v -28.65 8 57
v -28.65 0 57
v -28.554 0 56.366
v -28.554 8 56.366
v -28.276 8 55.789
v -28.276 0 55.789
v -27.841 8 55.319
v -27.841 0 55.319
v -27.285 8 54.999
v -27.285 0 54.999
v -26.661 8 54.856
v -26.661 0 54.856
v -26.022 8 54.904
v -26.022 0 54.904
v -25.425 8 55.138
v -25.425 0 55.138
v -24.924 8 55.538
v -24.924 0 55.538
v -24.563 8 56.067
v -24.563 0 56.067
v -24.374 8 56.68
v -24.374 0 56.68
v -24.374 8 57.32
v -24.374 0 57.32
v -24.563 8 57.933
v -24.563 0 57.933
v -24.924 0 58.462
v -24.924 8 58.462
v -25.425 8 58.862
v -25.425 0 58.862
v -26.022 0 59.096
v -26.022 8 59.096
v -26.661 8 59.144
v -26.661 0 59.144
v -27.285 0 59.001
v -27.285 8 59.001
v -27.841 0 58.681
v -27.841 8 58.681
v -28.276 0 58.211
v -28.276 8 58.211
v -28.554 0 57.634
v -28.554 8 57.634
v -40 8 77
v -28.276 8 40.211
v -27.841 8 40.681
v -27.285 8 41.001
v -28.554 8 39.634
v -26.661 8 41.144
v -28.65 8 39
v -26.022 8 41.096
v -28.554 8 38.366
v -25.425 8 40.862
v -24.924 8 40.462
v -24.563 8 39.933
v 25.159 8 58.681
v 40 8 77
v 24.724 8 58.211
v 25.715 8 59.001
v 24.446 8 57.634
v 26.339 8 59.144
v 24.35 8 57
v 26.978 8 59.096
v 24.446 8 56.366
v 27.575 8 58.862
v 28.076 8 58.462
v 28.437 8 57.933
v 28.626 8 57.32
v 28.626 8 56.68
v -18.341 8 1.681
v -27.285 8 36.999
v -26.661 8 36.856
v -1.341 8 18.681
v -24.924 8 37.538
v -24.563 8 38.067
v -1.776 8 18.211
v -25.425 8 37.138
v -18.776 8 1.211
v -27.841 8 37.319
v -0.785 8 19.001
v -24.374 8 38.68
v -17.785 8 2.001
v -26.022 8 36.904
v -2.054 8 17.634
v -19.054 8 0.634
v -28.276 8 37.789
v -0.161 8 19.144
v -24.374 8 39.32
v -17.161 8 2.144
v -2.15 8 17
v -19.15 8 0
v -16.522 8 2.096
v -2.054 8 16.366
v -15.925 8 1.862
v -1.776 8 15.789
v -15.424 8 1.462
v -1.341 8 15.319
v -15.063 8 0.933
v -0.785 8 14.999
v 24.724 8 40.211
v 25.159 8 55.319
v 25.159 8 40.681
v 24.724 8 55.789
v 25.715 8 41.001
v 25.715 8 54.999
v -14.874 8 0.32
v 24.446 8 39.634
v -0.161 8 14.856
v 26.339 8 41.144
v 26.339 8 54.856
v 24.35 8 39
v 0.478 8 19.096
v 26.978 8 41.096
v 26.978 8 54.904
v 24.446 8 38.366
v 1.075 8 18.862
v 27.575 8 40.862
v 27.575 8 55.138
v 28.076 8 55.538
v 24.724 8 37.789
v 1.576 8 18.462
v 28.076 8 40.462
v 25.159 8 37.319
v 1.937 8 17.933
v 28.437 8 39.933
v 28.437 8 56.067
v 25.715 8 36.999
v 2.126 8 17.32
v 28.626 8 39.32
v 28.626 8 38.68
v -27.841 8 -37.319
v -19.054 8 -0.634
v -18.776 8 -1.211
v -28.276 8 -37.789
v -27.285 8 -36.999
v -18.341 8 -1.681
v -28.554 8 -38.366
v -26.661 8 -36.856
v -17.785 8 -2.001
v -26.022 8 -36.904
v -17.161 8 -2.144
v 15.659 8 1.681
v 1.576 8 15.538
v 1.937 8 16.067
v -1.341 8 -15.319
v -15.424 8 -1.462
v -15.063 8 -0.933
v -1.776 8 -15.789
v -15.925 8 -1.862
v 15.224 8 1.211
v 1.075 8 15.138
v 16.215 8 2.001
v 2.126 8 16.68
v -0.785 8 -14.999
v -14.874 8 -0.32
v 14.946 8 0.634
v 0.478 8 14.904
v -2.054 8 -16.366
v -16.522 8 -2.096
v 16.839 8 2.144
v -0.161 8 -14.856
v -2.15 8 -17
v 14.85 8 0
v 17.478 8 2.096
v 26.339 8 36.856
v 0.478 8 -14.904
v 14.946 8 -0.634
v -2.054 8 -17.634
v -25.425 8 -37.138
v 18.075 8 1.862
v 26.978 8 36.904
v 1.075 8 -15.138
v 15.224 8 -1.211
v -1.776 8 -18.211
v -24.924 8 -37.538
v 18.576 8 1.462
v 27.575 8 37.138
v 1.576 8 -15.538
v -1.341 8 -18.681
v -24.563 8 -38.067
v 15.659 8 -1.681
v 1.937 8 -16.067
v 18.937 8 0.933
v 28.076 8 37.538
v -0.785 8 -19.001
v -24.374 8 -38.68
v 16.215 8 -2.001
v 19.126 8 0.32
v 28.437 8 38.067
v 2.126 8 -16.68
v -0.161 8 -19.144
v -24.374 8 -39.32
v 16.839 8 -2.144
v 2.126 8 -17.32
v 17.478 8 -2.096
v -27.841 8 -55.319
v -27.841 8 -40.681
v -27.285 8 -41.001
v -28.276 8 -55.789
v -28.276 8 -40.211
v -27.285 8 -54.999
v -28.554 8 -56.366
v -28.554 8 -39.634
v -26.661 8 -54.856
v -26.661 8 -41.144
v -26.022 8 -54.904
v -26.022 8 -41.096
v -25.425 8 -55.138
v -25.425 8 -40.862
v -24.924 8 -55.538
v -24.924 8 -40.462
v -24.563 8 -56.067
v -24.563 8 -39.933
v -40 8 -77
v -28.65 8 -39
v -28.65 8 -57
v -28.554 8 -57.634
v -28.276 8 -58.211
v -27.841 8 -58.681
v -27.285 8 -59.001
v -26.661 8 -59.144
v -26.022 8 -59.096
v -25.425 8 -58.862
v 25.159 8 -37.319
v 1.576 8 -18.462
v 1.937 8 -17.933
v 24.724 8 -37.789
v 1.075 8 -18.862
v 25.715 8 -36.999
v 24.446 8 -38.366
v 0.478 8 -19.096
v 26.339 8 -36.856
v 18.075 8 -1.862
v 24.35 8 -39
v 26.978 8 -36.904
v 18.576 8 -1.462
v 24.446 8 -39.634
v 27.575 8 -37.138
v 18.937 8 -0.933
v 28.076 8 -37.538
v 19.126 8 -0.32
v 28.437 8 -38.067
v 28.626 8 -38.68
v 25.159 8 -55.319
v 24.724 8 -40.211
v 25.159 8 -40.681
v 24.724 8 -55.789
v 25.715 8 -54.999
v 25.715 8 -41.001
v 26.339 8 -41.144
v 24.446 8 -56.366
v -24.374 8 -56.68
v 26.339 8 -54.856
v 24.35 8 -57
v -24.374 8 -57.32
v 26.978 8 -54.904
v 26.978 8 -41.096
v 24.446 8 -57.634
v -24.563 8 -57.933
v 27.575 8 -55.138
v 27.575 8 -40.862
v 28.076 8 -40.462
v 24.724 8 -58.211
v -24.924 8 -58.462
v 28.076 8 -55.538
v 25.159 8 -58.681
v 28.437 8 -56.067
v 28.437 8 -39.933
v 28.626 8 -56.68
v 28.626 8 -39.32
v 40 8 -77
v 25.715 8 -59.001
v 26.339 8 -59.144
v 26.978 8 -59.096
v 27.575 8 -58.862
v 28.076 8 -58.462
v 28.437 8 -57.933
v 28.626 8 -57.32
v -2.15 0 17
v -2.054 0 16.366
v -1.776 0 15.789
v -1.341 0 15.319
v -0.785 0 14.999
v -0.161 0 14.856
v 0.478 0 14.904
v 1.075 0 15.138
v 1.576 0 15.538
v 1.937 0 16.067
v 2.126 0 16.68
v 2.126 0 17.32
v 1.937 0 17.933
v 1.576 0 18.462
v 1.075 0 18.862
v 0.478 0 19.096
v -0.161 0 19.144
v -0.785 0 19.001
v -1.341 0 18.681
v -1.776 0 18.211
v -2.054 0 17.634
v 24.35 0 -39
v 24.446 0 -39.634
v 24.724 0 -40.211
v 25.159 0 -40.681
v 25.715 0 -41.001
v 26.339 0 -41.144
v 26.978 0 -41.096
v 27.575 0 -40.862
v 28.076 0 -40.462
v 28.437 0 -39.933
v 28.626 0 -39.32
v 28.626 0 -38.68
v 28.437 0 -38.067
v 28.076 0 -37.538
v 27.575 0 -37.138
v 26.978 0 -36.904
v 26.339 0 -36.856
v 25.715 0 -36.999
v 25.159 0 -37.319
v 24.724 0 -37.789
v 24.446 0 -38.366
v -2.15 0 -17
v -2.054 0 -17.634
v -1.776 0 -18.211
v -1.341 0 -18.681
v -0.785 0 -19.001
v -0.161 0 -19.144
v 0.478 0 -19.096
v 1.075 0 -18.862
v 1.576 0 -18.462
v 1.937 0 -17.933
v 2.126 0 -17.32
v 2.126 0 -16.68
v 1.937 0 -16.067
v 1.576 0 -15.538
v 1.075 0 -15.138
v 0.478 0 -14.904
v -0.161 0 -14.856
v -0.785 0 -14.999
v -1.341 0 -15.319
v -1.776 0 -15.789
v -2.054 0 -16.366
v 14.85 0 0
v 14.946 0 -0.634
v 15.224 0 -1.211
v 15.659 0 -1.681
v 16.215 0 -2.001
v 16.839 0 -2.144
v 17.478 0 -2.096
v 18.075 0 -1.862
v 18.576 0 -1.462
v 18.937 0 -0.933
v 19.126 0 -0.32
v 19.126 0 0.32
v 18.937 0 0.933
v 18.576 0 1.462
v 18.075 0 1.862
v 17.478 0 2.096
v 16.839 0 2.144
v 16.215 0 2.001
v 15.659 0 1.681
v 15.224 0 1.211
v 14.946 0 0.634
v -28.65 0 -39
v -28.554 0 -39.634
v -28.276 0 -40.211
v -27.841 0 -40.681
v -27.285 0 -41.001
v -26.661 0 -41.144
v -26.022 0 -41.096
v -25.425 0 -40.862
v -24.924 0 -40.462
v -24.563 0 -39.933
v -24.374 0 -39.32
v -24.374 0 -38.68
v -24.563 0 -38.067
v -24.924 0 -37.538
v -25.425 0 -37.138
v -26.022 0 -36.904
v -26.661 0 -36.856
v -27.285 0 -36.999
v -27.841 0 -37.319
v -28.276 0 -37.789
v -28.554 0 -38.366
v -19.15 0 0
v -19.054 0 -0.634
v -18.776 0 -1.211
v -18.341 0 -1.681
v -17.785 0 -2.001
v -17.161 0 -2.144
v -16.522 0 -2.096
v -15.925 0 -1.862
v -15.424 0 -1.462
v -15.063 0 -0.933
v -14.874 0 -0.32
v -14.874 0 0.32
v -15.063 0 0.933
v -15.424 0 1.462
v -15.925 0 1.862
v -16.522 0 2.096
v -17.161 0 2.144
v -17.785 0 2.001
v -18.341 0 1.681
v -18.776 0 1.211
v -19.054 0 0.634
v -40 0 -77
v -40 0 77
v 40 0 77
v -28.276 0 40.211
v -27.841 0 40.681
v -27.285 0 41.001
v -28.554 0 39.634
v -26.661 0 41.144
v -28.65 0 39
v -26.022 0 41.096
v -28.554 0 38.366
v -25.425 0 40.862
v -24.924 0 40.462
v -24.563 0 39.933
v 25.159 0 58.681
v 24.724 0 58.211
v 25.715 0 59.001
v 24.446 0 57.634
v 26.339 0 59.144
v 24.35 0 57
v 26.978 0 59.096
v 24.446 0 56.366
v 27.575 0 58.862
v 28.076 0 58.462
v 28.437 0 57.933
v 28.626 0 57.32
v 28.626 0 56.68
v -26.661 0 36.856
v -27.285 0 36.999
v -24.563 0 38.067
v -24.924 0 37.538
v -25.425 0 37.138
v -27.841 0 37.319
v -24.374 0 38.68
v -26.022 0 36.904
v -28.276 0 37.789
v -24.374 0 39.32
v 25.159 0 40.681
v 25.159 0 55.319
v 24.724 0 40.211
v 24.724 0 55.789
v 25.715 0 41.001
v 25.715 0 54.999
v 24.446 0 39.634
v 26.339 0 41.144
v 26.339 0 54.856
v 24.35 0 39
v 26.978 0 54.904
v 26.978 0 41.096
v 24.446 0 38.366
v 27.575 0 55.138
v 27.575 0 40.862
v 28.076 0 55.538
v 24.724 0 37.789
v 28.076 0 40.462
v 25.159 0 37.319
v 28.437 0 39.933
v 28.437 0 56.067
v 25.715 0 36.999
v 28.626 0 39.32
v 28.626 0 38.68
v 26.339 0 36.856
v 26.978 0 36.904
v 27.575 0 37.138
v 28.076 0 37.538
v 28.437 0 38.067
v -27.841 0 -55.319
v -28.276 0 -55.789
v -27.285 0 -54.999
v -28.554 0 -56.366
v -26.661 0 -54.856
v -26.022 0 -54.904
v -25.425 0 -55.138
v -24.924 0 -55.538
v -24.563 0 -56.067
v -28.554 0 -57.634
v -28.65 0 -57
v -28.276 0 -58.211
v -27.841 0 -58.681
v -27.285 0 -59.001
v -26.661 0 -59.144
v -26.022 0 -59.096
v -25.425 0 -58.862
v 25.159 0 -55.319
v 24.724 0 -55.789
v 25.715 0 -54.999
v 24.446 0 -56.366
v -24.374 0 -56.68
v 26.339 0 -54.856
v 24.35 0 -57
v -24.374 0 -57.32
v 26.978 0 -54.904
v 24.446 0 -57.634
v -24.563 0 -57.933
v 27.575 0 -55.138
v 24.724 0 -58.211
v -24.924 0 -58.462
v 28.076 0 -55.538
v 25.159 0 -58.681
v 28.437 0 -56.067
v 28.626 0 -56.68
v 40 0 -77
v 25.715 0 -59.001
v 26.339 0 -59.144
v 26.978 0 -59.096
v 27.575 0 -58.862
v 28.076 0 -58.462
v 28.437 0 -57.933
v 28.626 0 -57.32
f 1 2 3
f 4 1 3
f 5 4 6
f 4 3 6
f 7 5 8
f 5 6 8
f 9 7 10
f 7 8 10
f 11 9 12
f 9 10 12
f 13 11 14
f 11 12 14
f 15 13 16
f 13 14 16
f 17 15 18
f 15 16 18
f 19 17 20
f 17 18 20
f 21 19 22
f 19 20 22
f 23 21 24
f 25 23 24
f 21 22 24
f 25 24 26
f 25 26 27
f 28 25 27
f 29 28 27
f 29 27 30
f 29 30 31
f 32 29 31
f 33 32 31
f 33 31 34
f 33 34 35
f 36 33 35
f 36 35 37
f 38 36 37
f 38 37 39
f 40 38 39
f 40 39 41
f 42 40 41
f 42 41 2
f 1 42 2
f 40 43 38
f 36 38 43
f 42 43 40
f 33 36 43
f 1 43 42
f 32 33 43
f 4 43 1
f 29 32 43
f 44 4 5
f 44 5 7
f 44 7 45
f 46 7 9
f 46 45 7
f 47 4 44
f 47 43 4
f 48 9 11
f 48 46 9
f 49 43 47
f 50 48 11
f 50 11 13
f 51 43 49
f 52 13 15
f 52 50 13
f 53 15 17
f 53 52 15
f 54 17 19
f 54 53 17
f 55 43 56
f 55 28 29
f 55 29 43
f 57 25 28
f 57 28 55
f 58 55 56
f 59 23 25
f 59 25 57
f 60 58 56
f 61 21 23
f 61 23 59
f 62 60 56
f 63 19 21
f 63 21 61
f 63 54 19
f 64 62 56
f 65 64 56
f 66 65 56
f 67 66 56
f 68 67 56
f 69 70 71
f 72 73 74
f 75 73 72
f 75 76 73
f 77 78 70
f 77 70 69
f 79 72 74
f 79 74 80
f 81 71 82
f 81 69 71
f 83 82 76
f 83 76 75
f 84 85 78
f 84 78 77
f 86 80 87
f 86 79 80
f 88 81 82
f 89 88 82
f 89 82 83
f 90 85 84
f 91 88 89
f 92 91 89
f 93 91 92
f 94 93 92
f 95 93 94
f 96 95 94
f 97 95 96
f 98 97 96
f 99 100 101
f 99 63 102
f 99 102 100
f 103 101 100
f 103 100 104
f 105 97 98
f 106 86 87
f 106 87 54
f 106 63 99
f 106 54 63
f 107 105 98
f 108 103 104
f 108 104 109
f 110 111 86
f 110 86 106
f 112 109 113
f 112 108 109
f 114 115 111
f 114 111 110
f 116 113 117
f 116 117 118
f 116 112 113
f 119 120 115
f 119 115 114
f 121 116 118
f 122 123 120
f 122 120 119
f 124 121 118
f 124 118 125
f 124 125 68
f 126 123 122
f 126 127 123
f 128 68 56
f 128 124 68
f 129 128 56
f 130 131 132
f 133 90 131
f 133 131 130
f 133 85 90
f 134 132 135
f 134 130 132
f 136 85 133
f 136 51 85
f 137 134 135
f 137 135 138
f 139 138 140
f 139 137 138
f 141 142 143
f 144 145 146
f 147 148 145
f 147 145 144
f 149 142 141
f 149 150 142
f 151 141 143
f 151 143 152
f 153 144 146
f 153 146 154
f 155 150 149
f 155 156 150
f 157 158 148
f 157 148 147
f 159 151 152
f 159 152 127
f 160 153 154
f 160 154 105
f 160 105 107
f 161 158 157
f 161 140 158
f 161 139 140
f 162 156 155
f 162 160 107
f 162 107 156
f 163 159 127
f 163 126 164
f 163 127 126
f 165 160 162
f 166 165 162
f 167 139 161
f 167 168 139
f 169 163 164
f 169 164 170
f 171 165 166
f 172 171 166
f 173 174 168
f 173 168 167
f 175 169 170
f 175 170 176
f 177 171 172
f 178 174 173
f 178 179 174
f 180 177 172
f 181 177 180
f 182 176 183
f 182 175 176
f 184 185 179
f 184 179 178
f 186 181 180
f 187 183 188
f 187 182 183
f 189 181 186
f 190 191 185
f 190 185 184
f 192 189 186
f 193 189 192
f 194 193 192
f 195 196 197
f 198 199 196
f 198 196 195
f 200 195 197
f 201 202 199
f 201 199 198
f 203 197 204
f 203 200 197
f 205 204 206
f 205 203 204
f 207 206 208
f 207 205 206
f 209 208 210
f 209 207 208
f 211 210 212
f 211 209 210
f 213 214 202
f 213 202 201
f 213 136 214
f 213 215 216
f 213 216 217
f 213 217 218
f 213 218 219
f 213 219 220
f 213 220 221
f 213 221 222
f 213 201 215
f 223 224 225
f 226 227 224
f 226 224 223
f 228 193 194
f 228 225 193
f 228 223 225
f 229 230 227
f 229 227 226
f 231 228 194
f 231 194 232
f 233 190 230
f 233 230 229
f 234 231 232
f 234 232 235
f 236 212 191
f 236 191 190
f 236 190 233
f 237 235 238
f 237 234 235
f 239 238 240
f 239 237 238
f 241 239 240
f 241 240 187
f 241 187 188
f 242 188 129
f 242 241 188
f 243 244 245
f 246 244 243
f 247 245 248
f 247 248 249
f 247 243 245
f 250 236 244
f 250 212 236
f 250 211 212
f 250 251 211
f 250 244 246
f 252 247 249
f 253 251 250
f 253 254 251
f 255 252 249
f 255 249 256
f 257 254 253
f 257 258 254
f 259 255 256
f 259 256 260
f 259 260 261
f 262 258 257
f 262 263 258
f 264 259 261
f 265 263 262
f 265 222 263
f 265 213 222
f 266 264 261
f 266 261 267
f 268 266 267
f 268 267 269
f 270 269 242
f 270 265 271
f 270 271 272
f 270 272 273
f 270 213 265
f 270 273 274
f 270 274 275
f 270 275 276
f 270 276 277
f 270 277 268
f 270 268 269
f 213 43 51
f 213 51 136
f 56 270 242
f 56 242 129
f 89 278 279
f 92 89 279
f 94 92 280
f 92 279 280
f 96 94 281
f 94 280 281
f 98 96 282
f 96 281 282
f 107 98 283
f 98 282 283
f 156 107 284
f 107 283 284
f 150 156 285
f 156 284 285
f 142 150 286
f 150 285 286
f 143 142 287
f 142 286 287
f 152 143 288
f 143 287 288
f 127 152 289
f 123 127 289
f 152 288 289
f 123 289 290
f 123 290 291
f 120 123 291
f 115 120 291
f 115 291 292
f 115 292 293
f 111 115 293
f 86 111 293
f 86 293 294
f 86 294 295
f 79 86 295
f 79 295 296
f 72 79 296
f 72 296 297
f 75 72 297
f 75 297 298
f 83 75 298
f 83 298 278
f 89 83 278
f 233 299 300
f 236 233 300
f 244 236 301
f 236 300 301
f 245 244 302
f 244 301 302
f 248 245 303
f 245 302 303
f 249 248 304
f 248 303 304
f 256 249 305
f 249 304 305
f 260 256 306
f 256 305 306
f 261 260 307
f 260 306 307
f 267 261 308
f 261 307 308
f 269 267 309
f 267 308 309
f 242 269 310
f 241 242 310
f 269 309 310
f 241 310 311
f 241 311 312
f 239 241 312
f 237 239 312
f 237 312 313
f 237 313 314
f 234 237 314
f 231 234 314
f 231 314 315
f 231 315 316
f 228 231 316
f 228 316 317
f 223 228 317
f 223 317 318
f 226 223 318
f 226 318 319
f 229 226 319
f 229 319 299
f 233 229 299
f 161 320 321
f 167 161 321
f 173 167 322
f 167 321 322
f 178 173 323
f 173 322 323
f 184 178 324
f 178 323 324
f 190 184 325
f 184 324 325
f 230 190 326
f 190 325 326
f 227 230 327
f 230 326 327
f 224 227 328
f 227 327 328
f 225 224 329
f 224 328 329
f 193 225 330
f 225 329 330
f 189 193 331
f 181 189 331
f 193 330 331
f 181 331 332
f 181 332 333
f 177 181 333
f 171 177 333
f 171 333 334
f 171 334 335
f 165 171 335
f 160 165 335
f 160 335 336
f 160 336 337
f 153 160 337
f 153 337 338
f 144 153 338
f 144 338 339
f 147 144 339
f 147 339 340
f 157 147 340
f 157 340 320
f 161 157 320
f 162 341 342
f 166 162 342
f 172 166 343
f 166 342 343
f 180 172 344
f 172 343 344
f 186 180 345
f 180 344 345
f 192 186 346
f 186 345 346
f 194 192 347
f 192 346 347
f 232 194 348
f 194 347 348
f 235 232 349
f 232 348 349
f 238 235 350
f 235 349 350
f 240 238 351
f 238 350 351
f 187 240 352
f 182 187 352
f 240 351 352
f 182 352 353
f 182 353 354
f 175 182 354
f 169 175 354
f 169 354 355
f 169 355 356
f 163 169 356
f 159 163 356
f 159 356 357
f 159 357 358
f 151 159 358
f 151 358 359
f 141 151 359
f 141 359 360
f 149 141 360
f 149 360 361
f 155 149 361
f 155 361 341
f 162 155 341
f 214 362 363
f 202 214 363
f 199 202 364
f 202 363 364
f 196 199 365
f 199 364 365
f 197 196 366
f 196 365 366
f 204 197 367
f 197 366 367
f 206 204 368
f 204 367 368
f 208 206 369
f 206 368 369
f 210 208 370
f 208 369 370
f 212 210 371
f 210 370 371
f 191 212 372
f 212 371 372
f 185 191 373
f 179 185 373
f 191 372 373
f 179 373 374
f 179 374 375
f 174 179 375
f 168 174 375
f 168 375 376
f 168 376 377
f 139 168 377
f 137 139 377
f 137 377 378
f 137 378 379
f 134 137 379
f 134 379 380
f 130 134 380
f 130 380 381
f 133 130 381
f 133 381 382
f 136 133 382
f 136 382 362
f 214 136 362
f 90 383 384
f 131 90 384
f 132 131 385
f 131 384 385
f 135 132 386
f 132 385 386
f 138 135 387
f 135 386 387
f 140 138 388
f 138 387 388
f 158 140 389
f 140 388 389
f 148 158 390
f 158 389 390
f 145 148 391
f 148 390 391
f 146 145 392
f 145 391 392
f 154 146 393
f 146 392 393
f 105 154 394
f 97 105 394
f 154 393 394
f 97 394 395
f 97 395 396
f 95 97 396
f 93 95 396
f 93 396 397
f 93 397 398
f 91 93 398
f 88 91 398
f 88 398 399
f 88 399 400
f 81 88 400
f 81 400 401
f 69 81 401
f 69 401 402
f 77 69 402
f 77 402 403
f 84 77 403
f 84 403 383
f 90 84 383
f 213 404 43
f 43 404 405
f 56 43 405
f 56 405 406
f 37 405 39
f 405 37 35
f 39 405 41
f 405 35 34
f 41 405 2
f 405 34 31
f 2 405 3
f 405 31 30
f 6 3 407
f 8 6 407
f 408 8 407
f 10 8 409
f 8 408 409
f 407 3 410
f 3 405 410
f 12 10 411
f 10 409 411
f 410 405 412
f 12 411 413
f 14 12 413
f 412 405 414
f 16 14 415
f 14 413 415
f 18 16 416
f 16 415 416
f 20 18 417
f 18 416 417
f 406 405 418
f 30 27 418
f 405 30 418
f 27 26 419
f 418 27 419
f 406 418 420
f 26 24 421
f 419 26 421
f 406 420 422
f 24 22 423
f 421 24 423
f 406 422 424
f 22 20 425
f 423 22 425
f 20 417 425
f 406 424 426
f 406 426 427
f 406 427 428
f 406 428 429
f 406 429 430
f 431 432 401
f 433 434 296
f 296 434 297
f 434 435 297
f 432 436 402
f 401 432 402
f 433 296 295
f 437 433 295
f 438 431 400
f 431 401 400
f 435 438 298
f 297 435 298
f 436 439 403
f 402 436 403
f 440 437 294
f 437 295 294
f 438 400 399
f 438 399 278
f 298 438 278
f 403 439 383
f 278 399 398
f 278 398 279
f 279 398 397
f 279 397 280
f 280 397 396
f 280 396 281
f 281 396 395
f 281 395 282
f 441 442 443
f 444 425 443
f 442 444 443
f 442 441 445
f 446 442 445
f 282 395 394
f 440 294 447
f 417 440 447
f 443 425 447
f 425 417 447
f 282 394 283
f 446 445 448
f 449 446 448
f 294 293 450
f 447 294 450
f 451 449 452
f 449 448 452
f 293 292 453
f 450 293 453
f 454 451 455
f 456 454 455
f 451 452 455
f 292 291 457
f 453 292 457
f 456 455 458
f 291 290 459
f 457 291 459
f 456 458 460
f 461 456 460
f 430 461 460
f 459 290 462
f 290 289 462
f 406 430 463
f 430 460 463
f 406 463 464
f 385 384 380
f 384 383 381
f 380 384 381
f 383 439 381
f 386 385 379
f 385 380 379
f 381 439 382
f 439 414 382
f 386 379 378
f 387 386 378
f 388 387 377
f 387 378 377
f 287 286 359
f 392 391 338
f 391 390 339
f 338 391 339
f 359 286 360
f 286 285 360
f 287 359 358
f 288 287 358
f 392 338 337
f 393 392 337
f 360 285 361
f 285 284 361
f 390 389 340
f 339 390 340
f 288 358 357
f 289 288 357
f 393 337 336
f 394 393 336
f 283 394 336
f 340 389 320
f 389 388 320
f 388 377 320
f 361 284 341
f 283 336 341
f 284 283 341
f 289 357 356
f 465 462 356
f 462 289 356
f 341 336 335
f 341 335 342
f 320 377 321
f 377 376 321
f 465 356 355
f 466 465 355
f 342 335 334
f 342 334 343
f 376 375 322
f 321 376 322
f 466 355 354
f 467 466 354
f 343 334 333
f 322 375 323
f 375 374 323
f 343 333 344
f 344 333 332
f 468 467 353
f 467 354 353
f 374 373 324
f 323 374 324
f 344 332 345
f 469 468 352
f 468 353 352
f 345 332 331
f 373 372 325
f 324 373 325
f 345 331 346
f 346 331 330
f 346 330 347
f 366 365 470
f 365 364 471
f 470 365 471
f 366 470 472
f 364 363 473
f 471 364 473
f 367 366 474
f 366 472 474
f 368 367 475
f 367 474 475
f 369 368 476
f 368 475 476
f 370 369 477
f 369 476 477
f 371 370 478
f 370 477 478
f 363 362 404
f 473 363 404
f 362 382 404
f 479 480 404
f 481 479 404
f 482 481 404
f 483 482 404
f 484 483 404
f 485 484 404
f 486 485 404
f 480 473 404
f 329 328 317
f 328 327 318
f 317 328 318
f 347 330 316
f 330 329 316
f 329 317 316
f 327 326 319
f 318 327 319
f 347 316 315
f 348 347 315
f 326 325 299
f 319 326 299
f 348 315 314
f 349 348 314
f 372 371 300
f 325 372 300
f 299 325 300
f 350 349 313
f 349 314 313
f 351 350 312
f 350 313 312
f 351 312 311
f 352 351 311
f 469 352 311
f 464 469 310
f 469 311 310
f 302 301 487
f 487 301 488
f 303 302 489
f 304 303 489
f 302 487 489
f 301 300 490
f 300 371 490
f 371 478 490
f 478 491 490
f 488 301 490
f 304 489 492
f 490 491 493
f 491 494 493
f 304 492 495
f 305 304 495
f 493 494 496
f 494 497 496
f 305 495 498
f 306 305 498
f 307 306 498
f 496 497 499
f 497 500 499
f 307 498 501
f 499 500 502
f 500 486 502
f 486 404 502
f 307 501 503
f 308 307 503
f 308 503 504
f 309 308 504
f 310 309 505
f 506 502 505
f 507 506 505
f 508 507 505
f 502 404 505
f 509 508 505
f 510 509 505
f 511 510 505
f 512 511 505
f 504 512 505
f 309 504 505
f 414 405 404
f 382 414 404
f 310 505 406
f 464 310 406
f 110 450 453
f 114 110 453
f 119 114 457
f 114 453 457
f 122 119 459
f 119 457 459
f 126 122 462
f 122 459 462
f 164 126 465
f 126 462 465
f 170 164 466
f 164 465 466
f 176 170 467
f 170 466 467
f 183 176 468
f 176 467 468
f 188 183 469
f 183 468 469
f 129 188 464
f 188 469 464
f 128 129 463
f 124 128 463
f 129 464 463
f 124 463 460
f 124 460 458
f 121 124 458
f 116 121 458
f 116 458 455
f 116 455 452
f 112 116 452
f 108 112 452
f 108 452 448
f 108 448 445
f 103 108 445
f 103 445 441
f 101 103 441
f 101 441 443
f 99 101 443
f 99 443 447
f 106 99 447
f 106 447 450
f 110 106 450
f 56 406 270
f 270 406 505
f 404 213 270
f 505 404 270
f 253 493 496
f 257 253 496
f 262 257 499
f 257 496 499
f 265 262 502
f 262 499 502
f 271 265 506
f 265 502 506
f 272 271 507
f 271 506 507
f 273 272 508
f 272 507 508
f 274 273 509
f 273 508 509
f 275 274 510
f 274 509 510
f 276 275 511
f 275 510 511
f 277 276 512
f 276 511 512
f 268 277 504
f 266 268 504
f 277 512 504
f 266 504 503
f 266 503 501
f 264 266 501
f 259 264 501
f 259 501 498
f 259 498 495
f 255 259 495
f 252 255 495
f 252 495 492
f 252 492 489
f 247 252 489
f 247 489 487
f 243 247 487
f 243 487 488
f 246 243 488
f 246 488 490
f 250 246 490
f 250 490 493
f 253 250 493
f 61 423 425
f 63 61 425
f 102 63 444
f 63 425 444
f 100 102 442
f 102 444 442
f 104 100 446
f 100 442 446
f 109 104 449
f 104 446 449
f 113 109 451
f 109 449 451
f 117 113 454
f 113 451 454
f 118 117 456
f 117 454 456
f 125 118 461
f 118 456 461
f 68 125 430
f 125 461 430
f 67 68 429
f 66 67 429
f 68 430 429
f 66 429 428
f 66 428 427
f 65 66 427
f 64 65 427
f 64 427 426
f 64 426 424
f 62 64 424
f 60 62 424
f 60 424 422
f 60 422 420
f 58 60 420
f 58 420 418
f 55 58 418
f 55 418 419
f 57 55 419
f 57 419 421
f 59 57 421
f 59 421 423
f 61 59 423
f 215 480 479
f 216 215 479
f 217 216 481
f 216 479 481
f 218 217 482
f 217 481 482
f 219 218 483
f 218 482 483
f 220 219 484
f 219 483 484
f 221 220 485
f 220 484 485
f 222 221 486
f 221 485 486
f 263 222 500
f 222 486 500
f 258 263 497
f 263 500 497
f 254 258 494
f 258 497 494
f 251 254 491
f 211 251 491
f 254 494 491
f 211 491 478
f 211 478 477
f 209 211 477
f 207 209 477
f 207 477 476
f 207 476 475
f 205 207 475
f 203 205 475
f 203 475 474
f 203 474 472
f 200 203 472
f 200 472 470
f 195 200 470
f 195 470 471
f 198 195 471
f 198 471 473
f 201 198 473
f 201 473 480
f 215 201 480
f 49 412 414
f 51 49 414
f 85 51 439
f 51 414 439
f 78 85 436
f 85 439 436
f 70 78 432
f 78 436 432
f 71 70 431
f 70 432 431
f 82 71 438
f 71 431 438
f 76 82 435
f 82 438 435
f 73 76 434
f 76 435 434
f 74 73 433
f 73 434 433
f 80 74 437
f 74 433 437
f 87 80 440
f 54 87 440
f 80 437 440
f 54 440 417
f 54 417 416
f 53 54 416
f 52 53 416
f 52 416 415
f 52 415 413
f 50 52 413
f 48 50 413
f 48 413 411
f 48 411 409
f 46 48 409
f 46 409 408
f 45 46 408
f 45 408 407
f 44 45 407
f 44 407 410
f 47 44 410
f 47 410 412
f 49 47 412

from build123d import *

# Parameters (mm, degrees)
BOSS_EXTRUDE1_DEPTH  = 8
M4_CLEARANCE_HOLE1_D = 4.3
SKETCH4_W            = 80
SKETCH4_H            = 3.5
CUT_EXTRUDE1_DEPTH   = 10
M4_CLEARANCE_HOLE2_D = 4.3


with BuildPart() as part:
    # Sketch1 → Boss-Extrude1 (new body)
    with BuildSketch(Plane(origin=(0, 0, 0), x_dir=(1, 0, 0), z_dir=(0, 1, 0))):
        Polygon((-40, 80.5), (-40, 0), (-40, -80.5), (40, -80.5), (40, 80.5), align=None)
    extrude(amount=BOSS_EXTRUDE1_DEPTH)

    # M4 Clearance Hole1 (through all)
    with Locations(Plane(origin=(0, 8, 0), x_dir=(1, 0, 0), z_dir=(0, 1, 0))):
        with Locations((-26.5, 57), (26.5, 57), (-26.5, 39), (26.5, 39), (26.5, -39), (-26.5, -39), (26.5, -57), (-26.5, -57)):
            Hole(M4_CLEARANCE_HOLE1_D / 2)

    # Sketch4 → Cut-Extrude1 (cut)
    with BuildSketch(Plane(origin=(0, 8, 0), x_dir=(1, 0, 0), z_dir=(0, 1, 0))):
        with Locations((0, 78.75)):
            Rectangle(SKETCH4_W, SKETCH4_H)
        with Locations((0, -78.75)):
            Rectangle(SKETCH4_W, SKETCH4_H)
    extrude(amount=-CUT_EXTRUDE1_DEPTH, mode=Mode.SUBTRACT)

    # M4 Clearance Hole2 (through all)
    with Locations(Plane(origin=(0, 8, 0), x_dir=(1, 0, 0), z_dir=(0, 1, 0))):
        with Locations((-17, 0), (0, 17), (17, 0), (0, -17)):
            Hole(M4_CLEARANCE_HOLE2_D / 2)


solid = part.part
